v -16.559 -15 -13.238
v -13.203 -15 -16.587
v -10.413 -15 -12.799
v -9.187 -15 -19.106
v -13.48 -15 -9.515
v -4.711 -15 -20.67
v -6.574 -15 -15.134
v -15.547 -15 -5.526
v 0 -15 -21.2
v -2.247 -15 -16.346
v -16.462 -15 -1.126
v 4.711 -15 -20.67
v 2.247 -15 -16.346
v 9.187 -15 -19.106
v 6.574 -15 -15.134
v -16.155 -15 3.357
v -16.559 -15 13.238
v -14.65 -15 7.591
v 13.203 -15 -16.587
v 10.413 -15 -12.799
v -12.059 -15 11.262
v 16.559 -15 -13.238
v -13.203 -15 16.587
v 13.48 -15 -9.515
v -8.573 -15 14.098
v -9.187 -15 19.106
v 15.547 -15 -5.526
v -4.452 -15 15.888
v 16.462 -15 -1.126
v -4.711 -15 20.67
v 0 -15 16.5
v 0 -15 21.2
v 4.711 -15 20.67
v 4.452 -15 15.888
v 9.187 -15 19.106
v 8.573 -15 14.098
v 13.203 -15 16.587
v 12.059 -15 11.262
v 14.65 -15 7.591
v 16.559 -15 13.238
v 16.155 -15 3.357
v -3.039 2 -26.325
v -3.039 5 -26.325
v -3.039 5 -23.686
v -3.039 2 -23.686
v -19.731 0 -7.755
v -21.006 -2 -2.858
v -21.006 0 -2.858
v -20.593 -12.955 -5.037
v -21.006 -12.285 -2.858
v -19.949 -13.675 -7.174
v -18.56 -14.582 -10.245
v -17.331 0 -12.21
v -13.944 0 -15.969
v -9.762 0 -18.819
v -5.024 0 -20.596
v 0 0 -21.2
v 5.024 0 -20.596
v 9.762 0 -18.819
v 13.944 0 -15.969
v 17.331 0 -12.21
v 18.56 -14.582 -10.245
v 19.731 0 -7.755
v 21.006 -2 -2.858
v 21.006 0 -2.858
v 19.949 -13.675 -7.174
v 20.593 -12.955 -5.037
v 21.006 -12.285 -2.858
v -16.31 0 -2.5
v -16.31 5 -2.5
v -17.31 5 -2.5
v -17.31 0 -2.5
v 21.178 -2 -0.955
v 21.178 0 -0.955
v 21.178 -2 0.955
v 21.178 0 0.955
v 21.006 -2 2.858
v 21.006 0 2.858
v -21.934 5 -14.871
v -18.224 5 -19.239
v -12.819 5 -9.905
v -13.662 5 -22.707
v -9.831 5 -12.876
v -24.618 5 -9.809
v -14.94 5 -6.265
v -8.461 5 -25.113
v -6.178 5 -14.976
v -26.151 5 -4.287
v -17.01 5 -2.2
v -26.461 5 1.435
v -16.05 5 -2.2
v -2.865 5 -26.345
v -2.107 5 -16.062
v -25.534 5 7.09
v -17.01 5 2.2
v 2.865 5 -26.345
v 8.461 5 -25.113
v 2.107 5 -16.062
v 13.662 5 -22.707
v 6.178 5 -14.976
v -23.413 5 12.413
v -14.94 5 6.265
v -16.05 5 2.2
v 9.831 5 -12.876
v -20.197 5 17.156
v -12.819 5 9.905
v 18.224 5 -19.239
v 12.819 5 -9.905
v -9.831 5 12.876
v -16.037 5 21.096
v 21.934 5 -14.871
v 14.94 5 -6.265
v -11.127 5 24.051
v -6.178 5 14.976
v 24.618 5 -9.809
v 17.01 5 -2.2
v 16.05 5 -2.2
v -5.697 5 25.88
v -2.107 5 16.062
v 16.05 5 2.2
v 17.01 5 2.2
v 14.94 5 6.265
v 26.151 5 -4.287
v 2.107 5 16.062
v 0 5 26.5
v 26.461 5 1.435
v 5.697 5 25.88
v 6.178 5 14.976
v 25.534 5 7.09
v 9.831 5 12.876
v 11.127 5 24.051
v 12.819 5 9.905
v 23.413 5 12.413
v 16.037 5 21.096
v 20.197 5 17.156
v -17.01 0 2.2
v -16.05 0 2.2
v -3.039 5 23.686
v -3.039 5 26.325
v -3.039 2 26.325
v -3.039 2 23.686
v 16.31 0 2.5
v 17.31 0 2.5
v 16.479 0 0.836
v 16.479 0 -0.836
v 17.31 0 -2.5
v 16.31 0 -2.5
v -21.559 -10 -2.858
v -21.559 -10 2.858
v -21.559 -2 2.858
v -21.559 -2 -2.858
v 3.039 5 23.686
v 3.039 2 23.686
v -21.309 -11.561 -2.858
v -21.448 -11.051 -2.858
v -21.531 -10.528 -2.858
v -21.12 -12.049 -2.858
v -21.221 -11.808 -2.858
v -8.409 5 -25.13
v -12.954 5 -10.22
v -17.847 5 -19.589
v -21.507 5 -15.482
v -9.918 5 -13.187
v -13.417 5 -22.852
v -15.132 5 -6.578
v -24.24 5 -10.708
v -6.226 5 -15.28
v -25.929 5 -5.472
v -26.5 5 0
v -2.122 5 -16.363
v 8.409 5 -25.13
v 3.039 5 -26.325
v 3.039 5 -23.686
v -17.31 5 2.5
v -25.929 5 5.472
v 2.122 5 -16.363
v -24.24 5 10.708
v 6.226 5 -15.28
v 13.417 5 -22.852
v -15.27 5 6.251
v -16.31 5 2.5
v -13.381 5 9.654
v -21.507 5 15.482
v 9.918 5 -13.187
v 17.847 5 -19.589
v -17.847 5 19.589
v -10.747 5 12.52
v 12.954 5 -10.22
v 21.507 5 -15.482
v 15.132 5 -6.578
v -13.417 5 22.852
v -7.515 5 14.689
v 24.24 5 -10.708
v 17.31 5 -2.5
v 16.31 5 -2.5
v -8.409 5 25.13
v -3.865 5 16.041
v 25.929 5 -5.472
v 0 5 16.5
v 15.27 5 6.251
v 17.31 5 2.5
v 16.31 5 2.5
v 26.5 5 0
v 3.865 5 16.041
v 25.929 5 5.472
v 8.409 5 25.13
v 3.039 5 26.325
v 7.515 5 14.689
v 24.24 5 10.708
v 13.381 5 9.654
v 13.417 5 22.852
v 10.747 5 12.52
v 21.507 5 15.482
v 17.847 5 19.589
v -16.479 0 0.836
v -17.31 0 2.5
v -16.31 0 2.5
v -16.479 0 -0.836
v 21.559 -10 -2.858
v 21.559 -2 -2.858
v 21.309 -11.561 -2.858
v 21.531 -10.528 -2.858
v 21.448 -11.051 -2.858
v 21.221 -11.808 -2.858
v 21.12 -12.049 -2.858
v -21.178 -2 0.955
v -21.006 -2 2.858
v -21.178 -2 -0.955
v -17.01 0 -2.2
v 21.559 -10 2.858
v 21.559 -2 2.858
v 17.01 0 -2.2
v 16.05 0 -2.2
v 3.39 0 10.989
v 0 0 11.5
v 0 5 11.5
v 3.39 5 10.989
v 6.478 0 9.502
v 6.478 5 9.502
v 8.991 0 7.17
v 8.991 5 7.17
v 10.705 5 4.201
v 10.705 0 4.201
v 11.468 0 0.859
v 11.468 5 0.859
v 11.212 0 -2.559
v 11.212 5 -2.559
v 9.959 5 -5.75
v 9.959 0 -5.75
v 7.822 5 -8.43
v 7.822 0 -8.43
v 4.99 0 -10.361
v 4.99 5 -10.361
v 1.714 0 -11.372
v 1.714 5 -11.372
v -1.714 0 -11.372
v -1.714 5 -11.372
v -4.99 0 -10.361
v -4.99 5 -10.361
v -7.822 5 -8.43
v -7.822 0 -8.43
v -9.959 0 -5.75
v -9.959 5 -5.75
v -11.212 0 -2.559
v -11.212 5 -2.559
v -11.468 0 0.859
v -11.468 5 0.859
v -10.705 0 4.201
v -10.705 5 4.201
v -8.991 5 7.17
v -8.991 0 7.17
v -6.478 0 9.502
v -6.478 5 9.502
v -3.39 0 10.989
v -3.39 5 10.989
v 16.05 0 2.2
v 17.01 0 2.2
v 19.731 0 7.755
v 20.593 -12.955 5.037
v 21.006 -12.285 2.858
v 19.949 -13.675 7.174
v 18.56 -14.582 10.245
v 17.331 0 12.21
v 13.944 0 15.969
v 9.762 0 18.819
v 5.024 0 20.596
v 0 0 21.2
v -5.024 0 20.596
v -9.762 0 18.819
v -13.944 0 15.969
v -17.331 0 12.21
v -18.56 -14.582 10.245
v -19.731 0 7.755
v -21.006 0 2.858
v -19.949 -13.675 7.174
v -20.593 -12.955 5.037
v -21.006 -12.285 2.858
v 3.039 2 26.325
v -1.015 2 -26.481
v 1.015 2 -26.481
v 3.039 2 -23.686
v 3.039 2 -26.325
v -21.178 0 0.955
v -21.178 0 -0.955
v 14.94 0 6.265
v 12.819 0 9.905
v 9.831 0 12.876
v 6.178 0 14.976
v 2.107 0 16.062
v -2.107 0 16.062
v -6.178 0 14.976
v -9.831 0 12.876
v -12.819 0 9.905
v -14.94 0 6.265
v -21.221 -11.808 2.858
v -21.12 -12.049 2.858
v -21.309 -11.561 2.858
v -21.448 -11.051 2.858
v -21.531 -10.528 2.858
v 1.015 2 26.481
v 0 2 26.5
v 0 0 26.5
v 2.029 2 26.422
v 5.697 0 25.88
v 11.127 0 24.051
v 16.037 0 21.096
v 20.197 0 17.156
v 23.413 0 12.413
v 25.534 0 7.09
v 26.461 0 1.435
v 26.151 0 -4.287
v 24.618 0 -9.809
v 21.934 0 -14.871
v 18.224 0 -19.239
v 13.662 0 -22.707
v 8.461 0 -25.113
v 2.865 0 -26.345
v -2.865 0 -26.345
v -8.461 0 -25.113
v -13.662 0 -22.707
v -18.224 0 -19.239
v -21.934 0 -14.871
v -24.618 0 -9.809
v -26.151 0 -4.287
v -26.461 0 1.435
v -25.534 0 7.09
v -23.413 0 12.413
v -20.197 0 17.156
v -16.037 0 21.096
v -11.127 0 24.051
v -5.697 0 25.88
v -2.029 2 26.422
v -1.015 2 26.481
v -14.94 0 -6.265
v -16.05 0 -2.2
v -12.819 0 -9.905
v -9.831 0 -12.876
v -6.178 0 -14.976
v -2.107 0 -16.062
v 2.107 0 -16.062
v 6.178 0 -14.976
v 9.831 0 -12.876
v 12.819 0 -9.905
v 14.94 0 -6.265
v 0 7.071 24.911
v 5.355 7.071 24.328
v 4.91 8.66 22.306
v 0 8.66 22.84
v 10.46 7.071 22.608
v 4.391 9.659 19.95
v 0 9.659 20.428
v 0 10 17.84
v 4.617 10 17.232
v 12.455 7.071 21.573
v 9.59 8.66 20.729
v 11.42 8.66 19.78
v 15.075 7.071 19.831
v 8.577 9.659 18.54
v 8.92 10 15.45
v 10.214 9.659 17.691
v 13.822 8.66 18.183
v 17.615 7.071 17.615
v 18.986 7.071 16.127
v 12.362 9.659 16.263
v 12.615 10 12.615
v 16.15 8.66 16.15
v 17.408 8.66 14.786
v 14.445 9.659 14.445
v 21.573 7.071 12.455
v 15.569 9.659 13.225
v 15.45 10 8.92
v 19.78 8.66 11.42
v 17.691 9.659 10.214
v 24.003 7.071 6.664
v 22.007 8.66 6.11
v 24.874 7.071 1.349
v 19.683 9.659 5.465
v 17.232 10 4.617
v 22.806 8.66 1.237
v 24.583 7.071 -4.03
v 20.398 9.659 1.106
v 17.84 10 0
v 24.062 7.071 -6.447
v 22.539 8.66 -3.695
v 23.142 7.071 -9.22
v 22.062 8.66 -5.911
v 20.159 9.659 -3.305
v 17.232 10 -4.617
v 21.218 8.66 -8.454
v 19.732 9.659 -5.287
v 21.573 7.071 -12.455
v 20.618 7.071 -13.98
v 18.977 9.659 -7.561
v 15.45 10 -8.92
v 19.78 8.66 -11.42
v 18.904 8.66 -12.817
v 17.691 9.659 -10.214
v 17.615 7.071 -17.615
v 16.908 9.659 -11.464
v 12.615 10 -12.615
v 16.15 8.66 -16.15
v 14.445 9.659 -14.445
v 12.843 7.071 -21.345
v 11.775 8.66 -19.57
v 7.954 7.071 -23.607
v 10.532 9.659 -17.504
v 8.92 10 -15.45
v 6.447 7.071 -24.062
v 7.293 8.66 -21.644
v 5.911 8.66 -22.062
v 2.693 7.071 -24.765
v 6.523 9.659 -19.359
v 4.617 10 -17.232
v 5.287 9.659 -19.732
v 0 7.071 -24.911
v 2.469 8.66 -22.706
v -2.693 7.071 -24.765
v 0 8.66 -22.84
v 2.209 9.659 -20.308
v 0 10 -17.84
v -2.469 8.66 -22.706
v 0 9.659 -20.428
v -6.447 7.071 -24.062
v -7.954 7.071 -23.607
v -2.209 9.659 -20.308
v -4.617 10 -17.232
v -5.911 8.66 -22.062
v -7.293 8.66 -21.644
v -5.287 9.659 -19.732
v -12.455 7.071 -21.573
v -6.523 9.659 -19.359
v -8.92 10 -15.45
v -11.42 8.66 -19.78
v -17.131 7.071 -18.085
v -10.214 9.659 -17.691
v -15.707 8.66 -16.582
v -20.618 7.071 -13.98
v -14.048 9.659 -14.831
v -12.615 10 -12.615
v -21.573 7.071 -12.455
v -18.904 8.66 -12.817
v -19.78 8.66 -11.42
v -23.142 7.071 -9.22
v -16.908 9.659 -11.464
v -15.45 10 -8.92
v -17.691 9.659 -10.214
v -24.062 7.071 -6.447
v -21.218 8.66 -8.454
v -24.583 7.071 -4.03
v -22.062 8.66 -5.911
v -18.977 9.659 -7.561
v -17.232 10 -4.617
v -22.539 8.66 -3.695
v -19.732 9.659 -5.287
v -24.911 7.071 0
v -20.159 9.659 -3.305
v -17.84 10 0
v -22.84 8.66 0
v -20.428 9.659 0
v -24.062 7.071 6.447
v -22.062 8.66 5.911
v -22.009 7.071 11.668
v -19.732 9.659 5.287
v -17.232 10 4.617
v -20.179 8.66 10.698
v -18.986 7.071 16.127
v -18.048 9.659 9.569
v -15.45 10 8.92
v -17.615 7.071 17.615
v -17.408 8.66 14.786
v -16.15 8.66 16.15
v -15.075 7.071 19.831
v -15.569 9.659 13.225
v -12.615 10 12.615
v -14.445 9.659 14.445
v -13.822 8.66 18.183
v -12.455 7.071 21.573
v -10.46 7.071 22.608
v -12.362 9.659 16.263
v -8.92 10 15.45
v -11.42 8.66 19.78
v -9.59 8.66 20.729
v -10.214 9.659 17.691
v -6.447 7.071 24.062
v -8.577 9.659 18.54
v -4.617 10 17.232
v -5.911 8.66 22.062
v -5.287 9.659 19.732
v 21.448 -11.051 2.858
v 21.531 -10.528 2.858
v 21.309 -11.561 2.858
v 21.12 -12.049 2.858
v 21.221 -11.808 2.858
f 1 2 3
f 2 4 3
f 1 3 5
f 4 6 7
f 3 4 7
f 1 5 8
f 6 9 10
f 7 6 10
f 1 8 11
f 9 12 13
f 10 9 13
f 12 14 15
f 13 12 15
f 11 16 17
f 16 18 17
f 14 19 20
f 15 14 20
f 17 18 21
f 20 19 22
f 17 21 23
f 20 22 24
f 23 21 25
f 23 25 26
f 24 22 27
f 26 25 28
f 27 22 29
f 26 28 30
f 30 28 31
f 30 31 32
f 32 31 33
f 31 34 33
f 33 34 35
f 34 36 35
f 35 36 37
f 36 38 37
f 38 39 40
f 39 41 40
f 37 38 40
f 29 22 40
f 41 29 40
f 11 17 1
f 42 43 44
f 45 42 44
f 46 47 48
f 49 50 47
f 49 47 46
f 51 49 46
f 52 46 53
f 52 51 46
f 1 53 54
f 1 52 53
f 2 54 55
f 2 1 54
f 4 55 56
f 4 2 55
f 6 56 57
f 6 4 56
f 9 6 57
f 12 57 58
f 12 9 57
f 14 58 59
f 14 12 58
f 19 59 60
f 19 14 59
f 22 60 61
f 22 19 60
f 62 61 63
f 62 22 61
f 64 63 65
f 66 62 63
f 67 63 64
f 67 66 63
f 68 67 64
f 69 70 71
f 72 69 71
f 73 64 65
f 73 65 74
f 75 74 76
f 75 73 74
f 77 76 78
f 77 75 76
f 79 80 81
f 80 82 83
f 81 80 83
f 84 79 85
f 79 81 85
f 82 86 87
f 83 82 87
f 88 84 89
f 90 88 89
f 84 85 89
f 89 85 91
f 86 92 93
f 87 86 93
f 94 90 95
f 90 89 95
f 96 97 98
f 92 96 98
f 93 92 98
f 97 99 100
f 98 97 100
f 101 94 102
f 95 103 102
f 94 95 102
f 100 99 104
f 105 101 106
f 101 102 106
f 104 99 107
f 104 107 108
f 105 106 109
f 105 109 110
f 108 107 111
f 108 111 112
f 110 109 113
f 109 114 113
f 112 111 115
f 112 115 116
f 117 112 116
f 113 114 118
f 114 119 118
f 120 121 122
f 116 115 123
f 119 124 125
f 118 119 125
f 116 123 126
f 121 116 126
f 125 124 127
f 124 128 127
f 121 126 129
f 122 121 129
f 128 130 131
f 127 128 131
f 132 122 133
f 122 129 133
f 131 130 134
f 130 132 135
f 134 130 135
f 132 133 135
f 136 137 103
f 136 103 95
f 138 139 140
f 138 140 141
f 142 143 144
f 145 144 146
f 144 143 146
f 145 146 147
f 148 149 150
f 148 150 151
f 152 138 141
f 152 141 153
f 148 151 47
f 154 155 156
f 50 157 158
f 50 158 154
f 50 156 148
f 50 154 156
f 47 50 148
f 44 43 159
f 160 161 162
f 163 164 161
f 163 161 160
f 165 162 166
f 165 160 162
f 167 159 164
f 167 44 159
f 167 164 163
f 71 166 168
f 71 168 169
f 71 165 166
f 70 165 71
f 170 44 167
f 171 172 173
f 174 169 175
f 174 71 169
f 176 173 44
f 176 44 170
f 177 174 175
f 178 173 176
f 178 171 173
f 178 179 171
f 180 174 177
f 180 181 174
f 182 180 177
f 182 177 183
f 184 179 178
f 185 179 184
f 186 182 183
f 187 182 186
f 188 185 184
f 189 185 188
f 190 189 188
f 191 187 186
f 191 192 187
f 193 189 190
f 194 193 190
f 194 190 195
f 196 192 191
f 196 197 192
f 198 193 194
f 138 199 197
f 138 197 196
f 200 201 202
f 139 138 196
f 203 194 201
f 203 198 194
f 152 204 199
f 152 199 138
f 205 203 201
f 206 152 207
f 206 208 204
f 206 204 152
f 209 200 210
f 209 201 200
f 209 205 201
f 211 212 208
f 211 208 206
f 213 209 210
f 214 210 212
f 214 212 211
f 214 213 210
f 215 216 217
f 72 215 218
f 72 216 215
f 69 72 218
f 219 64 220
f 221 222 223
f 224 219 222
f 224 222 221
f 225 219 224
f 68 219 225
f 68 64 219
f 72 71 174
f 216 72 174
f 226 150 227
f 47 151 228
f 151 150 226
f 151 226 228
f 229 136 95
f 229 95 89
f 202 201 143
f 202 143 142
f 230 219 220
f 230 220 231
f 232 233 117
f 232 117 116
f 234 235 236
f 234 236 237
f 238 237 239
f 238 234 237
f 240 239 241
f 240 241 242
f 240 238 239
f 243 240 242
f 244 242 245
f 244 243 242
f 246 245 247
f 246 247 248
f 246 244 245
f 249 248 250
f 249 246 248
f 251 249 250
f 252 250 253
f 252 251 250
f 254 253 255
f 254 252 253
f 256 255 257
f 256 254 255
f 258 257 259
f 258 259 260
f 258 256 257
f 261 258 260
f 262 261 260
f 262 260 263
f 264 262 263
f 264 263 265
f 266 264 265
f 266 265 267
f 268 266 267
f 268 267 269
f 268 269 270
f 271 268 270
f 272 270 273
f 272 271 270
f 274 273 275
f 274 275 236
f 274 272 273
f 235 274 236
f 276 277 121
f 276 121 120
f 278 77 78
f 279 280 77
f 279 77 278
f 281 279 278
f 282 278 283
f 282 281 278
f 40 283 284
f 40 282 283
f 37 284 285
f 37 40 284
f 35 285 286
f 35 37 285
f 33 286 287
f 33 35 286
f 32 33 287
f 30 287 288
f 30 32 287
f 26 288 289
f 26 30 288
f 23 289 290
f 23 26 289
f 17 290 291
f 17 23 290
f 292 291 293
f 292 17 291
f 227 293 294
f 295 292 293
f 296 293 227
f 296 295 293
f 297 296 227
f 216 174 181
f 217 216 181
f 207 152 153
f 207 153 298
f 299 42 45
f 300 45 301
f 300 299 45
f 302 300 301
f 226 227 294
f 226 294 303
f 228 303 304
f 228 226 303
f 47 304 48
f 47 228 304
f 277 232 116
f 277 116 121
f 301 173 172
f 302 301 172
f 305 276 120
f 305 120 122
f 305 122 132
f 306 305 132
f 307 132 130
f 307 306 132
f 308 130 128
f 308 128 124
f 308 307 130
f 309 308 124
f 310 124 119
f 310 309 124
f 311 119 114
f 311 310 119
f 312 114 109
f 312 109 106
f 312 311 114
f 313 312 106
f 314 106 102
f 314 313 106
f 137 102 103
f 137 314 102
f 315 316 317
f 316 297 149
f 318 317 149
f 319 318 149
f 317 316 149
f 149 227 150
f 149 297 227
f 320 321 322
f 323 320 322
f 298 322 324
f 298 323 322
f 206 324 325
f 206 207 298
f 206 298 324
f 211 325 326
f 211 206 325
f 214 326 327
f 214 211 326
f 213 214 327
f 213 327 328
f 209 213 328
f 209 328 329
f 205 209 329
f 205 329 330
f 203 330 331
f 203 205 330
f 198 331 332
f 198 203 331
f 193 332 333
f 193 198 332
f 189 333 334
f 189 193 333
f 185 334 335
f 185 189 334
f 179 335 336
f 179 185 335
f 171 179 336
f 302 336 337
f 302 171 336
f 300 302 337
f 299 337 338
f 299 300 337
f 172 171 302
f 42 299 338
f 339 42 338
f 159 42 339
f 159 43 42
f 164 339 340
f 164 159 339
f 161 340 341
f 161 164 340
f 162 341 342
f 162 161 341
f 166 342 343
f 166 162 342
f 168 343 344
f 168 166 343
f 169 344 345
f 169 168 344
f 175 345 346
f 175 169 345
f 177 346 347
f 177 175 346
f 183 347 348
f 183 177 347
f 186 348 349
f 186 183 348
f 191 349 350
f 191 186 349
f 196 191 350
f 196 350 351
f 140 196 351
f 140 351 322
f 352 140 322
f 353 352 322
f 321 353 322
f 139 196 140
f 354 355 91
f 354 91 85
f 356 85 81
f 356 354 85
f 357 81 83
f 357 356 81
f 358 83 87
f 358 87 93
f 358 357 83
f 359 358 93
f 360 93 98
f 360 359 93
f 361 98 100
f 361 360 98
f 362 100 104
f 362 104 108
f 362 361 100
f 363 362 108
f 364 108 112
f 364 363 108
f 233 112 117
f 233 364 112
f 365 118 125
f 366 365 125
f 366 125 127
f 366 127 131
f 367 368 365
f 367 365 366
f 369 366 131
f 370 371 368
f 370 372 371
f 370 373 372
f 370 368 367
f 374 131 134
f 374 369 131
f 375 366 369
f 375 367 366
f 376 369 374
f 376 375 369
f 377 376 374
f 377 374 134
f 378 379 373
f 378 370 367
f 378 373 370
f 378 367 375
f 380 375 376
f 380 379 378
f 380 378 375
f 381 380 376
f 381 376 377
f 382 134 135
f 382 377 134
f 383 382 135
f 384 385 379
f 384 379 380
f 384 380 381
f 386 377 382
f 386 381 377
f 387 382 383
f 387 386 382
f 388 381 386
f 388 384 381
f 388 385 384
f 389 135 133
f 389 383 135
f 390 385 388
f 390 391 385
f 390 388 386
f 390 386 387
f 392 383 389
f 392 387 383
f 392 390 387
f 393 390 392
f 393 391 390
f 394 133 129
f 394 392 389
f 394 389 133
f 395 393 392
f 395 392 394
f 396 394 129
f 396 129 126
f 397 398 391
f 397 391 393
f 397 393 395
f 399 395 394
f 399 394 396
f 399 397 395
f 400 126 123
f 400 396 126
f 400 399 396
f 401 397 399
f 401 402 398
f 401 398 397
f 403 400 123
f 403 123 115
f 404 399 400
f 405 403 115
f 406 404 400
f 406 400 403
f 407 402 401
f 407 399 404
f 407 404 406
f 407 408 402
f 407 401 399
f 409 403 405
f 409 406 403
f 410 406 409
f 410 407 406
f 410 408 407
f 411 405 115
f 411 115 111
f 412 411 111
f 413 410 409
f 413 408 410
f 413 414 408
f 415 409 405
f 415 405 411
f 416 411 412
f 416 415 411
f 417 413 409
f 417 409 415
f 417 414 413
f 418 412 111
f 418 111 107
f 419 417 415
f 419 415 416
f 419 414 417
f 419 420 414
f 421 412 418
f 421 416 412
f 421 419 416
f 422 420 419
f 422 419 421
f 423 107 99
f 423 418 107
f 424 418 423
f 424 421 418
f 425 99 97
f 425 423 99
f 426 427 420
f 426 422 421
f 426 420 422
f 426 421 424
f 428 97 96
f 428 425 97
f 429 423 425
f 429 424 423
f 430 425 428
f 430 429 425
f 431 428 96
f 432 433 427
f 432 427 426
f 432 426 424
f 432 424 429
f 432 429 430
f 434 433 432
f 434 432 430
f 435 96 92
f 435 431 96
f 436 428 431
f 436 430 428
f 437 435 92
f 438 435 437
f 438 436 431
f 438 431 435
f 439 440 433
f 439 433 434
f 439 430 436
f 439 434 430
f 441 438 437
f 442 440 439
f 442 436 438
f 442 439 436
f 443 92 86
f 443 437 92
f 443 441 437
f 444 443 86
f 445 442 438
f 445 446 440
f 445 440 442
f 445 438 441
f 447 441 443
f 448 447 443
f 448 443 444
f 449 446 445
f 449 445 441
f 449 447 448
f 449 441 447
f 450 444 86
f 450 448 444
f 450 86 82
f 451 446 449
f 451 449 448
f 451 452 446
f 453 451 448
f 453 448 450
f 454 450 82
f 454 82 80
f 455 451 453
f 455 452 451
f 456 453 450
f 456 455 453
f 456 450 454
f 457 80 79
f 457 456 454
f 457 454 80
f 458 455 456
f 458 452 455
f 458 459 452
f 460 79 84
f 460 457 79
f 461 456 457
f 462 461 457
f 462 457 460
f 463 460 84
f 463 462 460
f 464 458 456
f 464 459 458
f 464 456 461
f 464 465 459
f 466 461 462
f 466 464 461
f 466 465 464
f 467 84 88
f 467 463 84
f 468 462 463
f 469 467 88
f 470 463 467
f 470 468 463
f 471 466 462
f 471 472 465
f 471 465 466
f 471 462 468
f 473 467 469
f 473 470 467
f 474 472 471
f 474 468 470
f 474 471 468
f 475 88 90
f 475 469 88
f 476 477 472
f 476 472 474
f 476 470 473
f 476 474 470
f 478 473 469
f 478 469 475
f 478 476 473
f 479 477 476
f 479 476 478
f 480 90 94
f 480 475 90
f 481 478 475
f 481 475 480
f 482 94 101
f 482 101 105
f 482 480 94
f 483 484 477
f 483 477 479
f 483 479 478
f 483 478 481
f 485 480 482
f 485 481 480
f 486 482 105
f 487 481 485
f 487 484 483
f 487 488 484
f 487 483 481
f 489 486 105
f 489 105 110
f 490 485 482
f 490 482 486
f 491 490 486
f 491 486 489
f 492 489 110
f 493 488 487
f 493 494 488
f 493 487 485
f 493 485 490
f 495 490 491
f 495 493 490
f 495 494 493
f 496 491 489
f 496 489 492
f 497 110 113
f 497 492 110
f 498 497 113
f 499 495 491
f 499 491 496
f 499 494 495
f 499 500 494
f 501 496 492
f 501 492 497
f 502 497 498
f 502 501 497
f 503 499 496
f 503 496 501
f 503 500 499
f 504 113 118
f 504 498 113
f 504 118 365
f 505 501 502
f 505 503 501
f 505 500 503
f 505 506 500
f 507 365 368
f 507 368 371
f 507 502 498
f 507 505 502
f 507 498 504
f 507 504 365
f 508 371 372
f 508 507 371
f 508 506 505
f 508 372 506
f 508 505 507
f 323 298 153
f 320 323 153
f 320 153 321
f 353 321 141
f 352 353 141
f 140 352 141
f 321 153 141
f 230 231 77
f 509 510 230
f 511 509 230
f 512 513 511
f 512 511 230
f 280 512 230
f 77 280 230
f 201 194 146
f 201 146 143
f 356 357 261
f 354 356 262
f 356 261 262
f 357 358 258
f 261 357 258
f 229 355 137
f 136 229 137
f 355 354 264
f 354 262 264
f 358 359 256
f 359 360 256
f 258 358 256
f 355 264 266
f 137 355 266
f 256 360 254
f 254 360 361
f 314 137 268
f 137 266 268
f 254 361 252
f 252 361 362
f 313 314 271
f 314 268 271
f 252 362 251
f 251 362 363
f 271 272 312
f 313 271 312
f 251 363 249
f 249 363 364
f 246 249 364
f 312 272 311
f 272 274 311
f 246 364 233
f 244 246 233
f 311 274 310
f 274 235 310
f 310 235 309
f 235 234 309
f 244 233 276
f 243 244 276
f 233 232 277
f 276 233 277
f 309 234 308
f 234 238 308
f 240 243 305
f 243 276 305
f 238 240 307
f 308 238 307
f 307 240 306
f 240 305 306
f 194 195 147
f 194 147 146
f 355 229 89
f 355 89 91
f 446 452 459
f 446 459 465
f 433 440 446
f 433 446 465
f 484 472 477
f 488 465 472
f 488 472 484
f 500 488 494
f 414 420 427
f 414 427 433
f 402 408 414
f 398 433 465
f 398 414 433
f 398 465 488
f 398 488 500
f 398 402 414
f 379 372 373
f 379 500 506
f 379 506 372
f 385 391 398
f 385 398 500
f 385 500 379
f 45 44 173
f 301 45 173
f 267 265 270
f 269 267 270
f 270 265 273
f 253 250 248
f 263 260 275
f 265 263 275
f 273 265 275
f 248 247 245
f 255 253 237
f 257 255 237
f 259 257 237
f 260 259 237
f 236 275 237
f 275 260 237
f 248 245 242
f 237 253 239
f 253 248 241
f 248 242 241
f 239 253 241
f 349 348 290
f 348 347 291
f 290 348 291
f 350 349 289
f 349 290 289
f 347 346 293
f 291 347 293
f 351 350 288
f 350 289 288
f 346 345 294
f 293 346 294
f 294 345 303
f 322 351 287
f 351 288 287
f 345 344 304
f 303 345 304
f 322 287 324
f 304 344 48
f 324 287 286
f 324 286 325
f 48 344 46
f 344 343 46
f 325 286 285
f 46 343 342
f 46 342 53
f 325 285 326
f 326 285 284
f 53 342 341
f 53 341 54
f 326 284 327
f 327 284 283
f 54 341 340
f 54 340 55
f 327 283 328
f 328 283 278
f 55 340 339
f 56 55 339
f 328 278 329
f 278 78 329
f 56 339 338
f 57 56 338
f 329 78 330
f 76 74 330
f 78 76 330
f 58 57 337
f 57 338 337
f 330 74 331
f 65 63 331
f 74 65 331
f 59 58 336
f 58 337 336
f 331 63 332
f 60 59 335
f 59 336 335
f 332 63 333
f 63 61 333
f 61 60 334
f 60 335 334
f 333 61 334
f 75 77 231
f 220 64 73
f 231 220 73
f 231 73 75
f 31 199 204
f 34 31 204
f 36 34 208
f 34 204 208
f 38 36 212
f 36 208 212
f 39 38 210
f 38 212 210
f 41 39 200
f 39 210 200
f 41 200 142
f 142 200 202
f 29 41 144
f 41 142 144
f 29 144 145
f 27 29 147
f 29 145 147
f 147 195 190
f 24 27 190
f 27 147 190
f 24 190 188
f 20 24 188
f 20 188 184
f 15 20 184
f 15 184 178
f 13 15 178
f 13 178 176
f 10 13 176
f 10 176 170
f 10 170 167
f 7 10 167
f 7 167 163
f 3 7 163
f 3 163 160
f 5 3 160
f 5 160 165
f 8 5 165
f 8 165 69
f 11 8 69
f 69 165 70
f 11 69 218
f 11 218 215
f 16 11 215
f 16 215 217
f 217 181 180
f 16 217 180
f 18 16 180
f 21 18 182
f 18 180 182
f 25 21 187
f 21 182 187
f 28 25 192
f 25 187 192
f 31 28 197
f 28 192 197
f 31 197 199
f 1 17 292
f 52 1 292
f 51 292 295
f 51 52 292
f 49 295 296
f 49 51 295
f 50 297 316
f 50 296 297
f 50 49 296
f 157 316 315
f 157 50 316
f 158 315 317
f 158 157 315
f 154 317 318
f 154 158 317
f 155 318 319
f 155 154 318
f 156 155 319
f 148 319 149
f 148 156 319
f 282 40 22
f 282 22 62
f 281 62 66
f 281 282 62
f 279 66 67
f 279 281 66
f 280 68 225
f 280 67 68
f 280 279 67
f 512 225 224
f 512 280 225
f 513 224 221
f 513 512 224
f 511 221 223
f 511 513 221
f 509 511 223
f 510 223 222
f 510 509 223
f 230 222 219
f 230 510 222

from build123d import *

# Parameters (mm, degrees)
SKETCH1_R           = 21.5
SKETCH1_R_2         = 16.5
BOSS_EXTRUDE2_DEPTH = 15
BOSS_EXTRUDE3_START = 5
SKETCH3_R           = 26.5
SKETCH3_R_2         = 16.5
BOSS_EXTRUDE3_DEPTH = 5
BOSS_EXTRUDE4_START = -13
BOSS_EXTRUDE4_DEPTH = 13
FILLET1_R           = 5
SKETCH7_R           = 16.5
SKETCH7_R_2         = 11.5
BOSS_EXTRUDE5_DEPTH = 5
SKETCH8_R           = 26.5
BOSS_EXTRUDE6_DEPTH = 5
FILLET2_R           = 10
CUT_EXTRUDE2_DEPTH  = 5
BOSS_EXTRUDE8_DEPTH = 5
CUT_EXTRUDE3_DEPTH  = 3
MOVE_START          = 4
MOVE_FACE1_DEPTH    = 6
MOVE_START_2        = -15
MOVE_FACE1_2_DEPTH  = 15
MOVE_START_3        = -2
MOVE_FACE1_3_DEPTH  = 2


with BuildPart() as part:
    # Sketch1 → Boss-Extrude2 (new body)
    with BuildSketch(Plane(origin=(0, 0, 0), x_dir=(1, 0, 0), z_dir=(0, 1, 0))):
        with Locations(Location((0, 0, 0), (0, 0, 270))):
            Circle(SKETCH1_R)
        with Locations(Location((0, 0, 0), (0, 0, 270))):
            Circle(SKETCH1_R_2, mode=Mode.SUBTRACT)
    extrude(amount=-BOSS_EXTRUDE2_DEPTH)

    # Sketch3 → Boss-Extrude3 (add)
    with BuildSketch(Plane(origin=(0, 0, 0), x_dir=(1, 0, 0), z_dir=(0, 1, 0)).offset(BOSS_EXTRUDE3_START)):
        with Locations(Location((0, 0, 0), (0, 0, 270))):
            Circle(SKETCH3_R)
        with Locations(Location((0, 0, 0), (0, 0, 270))):
            Circle(SKETCH3_R_2, mode=Mode.SUBTRACT)
    extrude(amount=-BOSS_EXTRUDE3_DEPTH)

    # Sketch5 → Boss-Extrude4 (add)
    with BuildSketch(Plane.XZ.offset(15).offset(BOSS_EXTRUDE4_START)):
        with BuildLine():
            Line((21.559218876, 2.857829749), (21.309218876, 2.857829749))
            ThreePointArc((21.309218876, 2.857829749), (21.452251698, 1.432095345), (21.5, 0))
            ThreePointArc((21.5, 0), (21.452251698, -1.432095345), (21.309218876, -2.857829749))
            Line((21.309218876, -2.857829749), (21.559218876, -2.857829749))
            Line((21.559218876, -2.857829749), (21.559218876, 2.857829749))
        make_face()
        with BuildLine():
            ThreePointArc((-21.309218876, -2.857829749), (-21.5, 0), (-21.309218876, 2.857829749))
            Line((-21.309218876, 2.857829749), (-21.559218876, 2.857829749))
            Line((-21.559218876, 2.857829749), (-21.559218876, -2.857829749))
            Line((-21.559218876, -2.857829749), (-21.309218876, -2.857829749))
        make_face()
    extrude(amount=BOSS_EXTRUDE4_DEPTH)

    # Fillet1
    fillet1_edges = [part.edges().sort_by_distance(p)[0] for p in [
        (-21.559218876, -15, 0),
        (21.559218876, -15, 0),
    ]]
    fillet(fillet1_edges, radius=FILLET1_R)

    # Sketch9 → Cut-Extrude2 (cut)
    with BuildSketch(Plane(origin=(0, 5, 0), x_dir=(1, 0, 0), z_dir=(0, 1, 0))):
        with BuildLine():
            Line((16.30950643, 2.5), (17.30950643, 2.5))
            Line((17.30950643, 2.5), (17.30950643, -2.5))
            Line((17.30950643, -2.5), (16.30950643, -2.5))
            ThreePointArc((16.30950643, -2.5), (16.5, 0), (16.30950643, 2.5))
        make_face()
        with BuildLine():
            Line((-17.30950643, -2.5), (-16.30950643, -2.5))
            ThreePointArc((-16.30950643, -2.5), (-16.5, 0), (-16.30950643, 2.5))
            Line((-16.30950643, 2.5), (-17.30950643, 2.5))
            Line((-17.30950643, 2.5), (-17.30950643, -2.5))
        make_face()
    extrude(amount=-CUT_EXTRUDE2_DEPTH, mode=Mode.SUBTRACT)

    # Sketch15 → Cut-Extrude3 (cut)
    with BuildSketch(Plane(origin=(0, 5, 0), x_dir=(1, 0, 0), z_dir=(0, 1, 0))):
        with BuildLine():
            Line((3.039184032, 23.685543065), (3.039184032, 26.325146921))
            ThreePointArc((3.039184032, 26.325146921), (0, 26.5), (-3.039184032, 26.325146921))
            Line((-3.039184032, 26.325146921), (-3.039184032, 23.685543065))
            Line((-3.039184032, 23.685543065), (3.039184032, 23.685543065))
        make_face()
        with BuildLine():
            Line((-3.039184032, -26.325146921), (-3.039184032, -23.685543065))
            Line((-3.039184032, -23.685543065), (3.039184032, -23.685543065))
            Line((3.039184032, -23.685543065), (3.039184032, -26.325146921))
            ThreePointArc((3.039184032, -26.325146921), (0, -26.5), (-3.039184032, -26.325146921))
        make_face()
    extrude(amount=-CUT_EXTRUDE3_DEPTH, mode=Mode.SUBTRACT)

    # Move Face1 2 outline → Move Face1 2 (cut)
    with BuildSketch(Plane(origin=(0, 0, 0), x_dir=(1, 0, 0), z_dir=(0, 1, 0)).offset(MOVE_START_2)):
        with BuildLine():
            ThreePointArc((-21.006494451, 2.857829749), (0, 21.2), (21.006494451, 2.857829749))
            Line((21.006494451, 2.857829749), (21.309218876, 2.857829749))
            ThreePointArc((21.309218876, 2.857829749), (0, 21.5), (-21.309218876, 2.857829749))
            Line((-21.309218876, 2.857829749), (-21.006494451, 2.857829749))
        make_face()
        with BuildLine():
            Line((21.309218876, -2.857829749), (21.006494451, -2.857829749))
            ThreePointArc((21.006494451, -2.857829749), (0, -21.2), (-21.006494451, -2.857829749))
            Line((-21.006494451, -2.857829749), (-21.309218876, -2.857829749))
            ThreePointArc((-21.309218876, -2.857829749), (0, -21.5), (21.309218876, -2.857829749))
        make_face()
    extrude(amount=MOVE_FACE1_2_DEPTH, mode=Mode.SUBTRACT)

    # Move Face1 3 outline → Move Face1 3 (cut)
    with BuildSketch(Plane(origin=(0, 0, 0), x_dir=(1, 0, 0), z_dir=(0, 1, 0)).offset(MOVE_START_3)):
        with BuildLine():
            ThreePointArc((21.006494451, 2.857829749), (21.2, 0), (21.006494451, -2.857829749))
            Line((21.006494451, -2.857829749), (21.309218876, -2.857829749))
            ThreePointArc((21.309218876, -2.857829749), (21.5, 0), (21.309218876, 2.857829749))
            Line((21.309218876, 2.857829749), (21.006494451, 2.857829749))
        make_face()
        with BuildLine():
            ThreePointArc((-21.006494451, -2.857829749), (-21.2, 0), (-21.006494451, 2.857829749))
            Line((-21.006494451, 2.857829749), (-21.309218876, 2.857829749))
            ThreePointArc((-21.309218876, 2.857829749), (-21.5, 0), (-21.309218876, -2.857829749))
            Line((-21.309218876, -2.857829749), (-21.006494451, -2.857829749))
        make_face()
    extrude(amount=MOVE_FACE1_3_DEPTH, mode=Mode.SUBTRACT)


with BuildPart() as body_2:
    # Sketch7 → Boss-Extrude5 (new body)
    with BuildSketch(Plane(origin=(0, 5, 0), x_dir=(1, 0, 0), z_dir=(0, 1, 0))):
        with Locations(Location((39.28088424, 30.935612703, 0), (0, 0, 270))):
            Circle(SKETCH7_R)
        with Locations(Location((39.28088424, 30.935612703, 0), (0, 0, 270))):
            Circle(SKETCH7_R_2, mode=Mode.SUBTRACT)
    extrude(amount=BOSS_EXTRUDE5_DEPTH)

    # Sketch8 → Boss-Extrude6 (add)
    with BuildSketch(Plane(origin=(0, 10, 0), x_dir=(1, 0, 0), z_dir=(0, 1, 0))):
        with Locations(Location((39.28088424, 30.935612703, 0), (0, 0, 270))):
            Circle(SKETCH8_R)
    extrude(amount=BOSS_EXTRUDE6_DEPTH)


with BuildPart() as body_2_1:
    # Body-Move/Copy1: moved
    add(body_2.part.moved(Location((-39.167227513, 0, 30.951860953))))


with BuildPart() as body_2_2:
    # Body-Move/Copy2: moved
    add(body_2_1.part.moved(Location((55, 0, 0))))

    # Fillet2
    # the kernel refuses this fillet: 10 mm, written as the material it takes off along each edge
    with BuildSketch(Plane(origin=(55.113656727, 15, 0.01624825), x_dir=(0, 0, 1), z_dir=(-1, 0, 0))) as fillet2_piece_1:
        with BuildLine():
            CenterArc((17.839745962, -10), FILLET2_R, 30, 60)
            Line((17.839745962, 0), (17.839745962, 0.2))
            Line((17.839745962, 0.2), (26.5, 0.2))
            Line((26.5, 0.2), (26.7, 0))
            ThreePointArc((26.7, 0), (26.7, -2.5), (26.673205081, -4.9))
            Line((26.673205081, -4.9), (26.5, -5))
        make_face()
    revolve(axis=Axis((55.113656727, 15, 0.01624825), (0, 1, 0)), mode=Mode.SUBTRACT)

    # Sketch10 → Boss-Extrude8 (add)
    with BuildSketch(Plane.XZ.offset(-5)):
        with BuildLine():
            Line((71.423163157, 2.51624825), (72.423163157, 2.51624825))
            Line((72.423163157, 2.51624825), (72.423163157, -2.48375175))
            Line((72.423163157, -2.48375175), (71.423163157, -2.48375175))
            ThreePointArc((71.423163157, -2.48375175), (71.613656727, 0.01624825), (71.423163157, 2.51624825))
        make_face()
        with BuildLine():
            Line((37.804150296, -2.48375175), (38.804150296, -2.48375175))
            ThreePointArc((38.804150296, -2.48375175), (38.613656727, 0.01624825), (38.804150296, 2.51624825))
            Line((38.804150296, 2.51624825), (37.804150296, 2.51624825))
            Line((37.804150296, 2.51624825), (37.804150296, -2.48375175))
        make_face()
    extrude(amount=-BOSS_EXTRUDE8_DEPTH)

    # Move Face1: read off the stored shape, not the designer's step
    # Move Face1 outline → Move Face1 (cut)
    with BuildSketch(Plane(origin=(0, 0, 0), x_dir=(1, 0, 0), z_dir=(0, 1, 0)).offset(MOVE_START)):
        with BuildLine():
            ThreePointArc((38.804150296, -2.51624825), (55.113656727, -16.51624825), (71.423163157, -2.51624825))
            Line((71.423163157, -2.51624825), (72.423163157, -2.51624825))
            Line((72.423163157, -2.51624825), (72.423163157, 2.48375175))
            Line((72.423163157, 2.48375175), (71.423163157, 2.48375175))
            ThreePointArc((71.423163157, 2.48375175), (55.113656727, 16.48375175), (38.804150296, 2.48375175))
            Line((38.804150296, 2.48375175), (37.804150296, 2.48375175))
            Line((37.804150296, 2.48375175), (37.804150296, -2.51624825))
            Line((37.804150296, -2.51624825), (38.804150296, -2.51624825))
        make_face()
        with BuildLine():
            Line((72.123163157, -2.21624825), (71.163578845, -2.21624825))
            ThreePointArc((71.163578845, -2.21624825), (55.113656726, -16.21624825), (39.063734608, -2.21624825))
            Line((39.063734608, -2.21624825), (38.104150296, -2.21624825))
            Line((38.104150296, -2.21624825), (38.104150296, 2.18375175))
            Line((38.104150296, 2.18375175), (39.063734608, 2.18375175))
            ThreePointArc((39.063734608, 2.18375175), (55.113656726, 16.18375175), (71.163578845, 2.18375175))
            Line((71.163578845, 2.18375175), (72.123163157, 2.18375175))
            Line((72.123163157, 2.18375175), (72.123163157, -2.21624825))
        make_face(mode=Mode.SUBTRACT)
    extrude(amount=MOVE_FACE1_DEPTH, mode=Mode.SUBTRACT)


with BuildPart() as body_2_3:
    # Body-Move/Copy3: read off the stored shape, not the designer's step
    # Body-Move/Copy3: moved
    add(body_2_2.part.moved(Location((-55.1136567, -5, -0.0162482))))


solid = Compound([part.part, body_2_3.part])
